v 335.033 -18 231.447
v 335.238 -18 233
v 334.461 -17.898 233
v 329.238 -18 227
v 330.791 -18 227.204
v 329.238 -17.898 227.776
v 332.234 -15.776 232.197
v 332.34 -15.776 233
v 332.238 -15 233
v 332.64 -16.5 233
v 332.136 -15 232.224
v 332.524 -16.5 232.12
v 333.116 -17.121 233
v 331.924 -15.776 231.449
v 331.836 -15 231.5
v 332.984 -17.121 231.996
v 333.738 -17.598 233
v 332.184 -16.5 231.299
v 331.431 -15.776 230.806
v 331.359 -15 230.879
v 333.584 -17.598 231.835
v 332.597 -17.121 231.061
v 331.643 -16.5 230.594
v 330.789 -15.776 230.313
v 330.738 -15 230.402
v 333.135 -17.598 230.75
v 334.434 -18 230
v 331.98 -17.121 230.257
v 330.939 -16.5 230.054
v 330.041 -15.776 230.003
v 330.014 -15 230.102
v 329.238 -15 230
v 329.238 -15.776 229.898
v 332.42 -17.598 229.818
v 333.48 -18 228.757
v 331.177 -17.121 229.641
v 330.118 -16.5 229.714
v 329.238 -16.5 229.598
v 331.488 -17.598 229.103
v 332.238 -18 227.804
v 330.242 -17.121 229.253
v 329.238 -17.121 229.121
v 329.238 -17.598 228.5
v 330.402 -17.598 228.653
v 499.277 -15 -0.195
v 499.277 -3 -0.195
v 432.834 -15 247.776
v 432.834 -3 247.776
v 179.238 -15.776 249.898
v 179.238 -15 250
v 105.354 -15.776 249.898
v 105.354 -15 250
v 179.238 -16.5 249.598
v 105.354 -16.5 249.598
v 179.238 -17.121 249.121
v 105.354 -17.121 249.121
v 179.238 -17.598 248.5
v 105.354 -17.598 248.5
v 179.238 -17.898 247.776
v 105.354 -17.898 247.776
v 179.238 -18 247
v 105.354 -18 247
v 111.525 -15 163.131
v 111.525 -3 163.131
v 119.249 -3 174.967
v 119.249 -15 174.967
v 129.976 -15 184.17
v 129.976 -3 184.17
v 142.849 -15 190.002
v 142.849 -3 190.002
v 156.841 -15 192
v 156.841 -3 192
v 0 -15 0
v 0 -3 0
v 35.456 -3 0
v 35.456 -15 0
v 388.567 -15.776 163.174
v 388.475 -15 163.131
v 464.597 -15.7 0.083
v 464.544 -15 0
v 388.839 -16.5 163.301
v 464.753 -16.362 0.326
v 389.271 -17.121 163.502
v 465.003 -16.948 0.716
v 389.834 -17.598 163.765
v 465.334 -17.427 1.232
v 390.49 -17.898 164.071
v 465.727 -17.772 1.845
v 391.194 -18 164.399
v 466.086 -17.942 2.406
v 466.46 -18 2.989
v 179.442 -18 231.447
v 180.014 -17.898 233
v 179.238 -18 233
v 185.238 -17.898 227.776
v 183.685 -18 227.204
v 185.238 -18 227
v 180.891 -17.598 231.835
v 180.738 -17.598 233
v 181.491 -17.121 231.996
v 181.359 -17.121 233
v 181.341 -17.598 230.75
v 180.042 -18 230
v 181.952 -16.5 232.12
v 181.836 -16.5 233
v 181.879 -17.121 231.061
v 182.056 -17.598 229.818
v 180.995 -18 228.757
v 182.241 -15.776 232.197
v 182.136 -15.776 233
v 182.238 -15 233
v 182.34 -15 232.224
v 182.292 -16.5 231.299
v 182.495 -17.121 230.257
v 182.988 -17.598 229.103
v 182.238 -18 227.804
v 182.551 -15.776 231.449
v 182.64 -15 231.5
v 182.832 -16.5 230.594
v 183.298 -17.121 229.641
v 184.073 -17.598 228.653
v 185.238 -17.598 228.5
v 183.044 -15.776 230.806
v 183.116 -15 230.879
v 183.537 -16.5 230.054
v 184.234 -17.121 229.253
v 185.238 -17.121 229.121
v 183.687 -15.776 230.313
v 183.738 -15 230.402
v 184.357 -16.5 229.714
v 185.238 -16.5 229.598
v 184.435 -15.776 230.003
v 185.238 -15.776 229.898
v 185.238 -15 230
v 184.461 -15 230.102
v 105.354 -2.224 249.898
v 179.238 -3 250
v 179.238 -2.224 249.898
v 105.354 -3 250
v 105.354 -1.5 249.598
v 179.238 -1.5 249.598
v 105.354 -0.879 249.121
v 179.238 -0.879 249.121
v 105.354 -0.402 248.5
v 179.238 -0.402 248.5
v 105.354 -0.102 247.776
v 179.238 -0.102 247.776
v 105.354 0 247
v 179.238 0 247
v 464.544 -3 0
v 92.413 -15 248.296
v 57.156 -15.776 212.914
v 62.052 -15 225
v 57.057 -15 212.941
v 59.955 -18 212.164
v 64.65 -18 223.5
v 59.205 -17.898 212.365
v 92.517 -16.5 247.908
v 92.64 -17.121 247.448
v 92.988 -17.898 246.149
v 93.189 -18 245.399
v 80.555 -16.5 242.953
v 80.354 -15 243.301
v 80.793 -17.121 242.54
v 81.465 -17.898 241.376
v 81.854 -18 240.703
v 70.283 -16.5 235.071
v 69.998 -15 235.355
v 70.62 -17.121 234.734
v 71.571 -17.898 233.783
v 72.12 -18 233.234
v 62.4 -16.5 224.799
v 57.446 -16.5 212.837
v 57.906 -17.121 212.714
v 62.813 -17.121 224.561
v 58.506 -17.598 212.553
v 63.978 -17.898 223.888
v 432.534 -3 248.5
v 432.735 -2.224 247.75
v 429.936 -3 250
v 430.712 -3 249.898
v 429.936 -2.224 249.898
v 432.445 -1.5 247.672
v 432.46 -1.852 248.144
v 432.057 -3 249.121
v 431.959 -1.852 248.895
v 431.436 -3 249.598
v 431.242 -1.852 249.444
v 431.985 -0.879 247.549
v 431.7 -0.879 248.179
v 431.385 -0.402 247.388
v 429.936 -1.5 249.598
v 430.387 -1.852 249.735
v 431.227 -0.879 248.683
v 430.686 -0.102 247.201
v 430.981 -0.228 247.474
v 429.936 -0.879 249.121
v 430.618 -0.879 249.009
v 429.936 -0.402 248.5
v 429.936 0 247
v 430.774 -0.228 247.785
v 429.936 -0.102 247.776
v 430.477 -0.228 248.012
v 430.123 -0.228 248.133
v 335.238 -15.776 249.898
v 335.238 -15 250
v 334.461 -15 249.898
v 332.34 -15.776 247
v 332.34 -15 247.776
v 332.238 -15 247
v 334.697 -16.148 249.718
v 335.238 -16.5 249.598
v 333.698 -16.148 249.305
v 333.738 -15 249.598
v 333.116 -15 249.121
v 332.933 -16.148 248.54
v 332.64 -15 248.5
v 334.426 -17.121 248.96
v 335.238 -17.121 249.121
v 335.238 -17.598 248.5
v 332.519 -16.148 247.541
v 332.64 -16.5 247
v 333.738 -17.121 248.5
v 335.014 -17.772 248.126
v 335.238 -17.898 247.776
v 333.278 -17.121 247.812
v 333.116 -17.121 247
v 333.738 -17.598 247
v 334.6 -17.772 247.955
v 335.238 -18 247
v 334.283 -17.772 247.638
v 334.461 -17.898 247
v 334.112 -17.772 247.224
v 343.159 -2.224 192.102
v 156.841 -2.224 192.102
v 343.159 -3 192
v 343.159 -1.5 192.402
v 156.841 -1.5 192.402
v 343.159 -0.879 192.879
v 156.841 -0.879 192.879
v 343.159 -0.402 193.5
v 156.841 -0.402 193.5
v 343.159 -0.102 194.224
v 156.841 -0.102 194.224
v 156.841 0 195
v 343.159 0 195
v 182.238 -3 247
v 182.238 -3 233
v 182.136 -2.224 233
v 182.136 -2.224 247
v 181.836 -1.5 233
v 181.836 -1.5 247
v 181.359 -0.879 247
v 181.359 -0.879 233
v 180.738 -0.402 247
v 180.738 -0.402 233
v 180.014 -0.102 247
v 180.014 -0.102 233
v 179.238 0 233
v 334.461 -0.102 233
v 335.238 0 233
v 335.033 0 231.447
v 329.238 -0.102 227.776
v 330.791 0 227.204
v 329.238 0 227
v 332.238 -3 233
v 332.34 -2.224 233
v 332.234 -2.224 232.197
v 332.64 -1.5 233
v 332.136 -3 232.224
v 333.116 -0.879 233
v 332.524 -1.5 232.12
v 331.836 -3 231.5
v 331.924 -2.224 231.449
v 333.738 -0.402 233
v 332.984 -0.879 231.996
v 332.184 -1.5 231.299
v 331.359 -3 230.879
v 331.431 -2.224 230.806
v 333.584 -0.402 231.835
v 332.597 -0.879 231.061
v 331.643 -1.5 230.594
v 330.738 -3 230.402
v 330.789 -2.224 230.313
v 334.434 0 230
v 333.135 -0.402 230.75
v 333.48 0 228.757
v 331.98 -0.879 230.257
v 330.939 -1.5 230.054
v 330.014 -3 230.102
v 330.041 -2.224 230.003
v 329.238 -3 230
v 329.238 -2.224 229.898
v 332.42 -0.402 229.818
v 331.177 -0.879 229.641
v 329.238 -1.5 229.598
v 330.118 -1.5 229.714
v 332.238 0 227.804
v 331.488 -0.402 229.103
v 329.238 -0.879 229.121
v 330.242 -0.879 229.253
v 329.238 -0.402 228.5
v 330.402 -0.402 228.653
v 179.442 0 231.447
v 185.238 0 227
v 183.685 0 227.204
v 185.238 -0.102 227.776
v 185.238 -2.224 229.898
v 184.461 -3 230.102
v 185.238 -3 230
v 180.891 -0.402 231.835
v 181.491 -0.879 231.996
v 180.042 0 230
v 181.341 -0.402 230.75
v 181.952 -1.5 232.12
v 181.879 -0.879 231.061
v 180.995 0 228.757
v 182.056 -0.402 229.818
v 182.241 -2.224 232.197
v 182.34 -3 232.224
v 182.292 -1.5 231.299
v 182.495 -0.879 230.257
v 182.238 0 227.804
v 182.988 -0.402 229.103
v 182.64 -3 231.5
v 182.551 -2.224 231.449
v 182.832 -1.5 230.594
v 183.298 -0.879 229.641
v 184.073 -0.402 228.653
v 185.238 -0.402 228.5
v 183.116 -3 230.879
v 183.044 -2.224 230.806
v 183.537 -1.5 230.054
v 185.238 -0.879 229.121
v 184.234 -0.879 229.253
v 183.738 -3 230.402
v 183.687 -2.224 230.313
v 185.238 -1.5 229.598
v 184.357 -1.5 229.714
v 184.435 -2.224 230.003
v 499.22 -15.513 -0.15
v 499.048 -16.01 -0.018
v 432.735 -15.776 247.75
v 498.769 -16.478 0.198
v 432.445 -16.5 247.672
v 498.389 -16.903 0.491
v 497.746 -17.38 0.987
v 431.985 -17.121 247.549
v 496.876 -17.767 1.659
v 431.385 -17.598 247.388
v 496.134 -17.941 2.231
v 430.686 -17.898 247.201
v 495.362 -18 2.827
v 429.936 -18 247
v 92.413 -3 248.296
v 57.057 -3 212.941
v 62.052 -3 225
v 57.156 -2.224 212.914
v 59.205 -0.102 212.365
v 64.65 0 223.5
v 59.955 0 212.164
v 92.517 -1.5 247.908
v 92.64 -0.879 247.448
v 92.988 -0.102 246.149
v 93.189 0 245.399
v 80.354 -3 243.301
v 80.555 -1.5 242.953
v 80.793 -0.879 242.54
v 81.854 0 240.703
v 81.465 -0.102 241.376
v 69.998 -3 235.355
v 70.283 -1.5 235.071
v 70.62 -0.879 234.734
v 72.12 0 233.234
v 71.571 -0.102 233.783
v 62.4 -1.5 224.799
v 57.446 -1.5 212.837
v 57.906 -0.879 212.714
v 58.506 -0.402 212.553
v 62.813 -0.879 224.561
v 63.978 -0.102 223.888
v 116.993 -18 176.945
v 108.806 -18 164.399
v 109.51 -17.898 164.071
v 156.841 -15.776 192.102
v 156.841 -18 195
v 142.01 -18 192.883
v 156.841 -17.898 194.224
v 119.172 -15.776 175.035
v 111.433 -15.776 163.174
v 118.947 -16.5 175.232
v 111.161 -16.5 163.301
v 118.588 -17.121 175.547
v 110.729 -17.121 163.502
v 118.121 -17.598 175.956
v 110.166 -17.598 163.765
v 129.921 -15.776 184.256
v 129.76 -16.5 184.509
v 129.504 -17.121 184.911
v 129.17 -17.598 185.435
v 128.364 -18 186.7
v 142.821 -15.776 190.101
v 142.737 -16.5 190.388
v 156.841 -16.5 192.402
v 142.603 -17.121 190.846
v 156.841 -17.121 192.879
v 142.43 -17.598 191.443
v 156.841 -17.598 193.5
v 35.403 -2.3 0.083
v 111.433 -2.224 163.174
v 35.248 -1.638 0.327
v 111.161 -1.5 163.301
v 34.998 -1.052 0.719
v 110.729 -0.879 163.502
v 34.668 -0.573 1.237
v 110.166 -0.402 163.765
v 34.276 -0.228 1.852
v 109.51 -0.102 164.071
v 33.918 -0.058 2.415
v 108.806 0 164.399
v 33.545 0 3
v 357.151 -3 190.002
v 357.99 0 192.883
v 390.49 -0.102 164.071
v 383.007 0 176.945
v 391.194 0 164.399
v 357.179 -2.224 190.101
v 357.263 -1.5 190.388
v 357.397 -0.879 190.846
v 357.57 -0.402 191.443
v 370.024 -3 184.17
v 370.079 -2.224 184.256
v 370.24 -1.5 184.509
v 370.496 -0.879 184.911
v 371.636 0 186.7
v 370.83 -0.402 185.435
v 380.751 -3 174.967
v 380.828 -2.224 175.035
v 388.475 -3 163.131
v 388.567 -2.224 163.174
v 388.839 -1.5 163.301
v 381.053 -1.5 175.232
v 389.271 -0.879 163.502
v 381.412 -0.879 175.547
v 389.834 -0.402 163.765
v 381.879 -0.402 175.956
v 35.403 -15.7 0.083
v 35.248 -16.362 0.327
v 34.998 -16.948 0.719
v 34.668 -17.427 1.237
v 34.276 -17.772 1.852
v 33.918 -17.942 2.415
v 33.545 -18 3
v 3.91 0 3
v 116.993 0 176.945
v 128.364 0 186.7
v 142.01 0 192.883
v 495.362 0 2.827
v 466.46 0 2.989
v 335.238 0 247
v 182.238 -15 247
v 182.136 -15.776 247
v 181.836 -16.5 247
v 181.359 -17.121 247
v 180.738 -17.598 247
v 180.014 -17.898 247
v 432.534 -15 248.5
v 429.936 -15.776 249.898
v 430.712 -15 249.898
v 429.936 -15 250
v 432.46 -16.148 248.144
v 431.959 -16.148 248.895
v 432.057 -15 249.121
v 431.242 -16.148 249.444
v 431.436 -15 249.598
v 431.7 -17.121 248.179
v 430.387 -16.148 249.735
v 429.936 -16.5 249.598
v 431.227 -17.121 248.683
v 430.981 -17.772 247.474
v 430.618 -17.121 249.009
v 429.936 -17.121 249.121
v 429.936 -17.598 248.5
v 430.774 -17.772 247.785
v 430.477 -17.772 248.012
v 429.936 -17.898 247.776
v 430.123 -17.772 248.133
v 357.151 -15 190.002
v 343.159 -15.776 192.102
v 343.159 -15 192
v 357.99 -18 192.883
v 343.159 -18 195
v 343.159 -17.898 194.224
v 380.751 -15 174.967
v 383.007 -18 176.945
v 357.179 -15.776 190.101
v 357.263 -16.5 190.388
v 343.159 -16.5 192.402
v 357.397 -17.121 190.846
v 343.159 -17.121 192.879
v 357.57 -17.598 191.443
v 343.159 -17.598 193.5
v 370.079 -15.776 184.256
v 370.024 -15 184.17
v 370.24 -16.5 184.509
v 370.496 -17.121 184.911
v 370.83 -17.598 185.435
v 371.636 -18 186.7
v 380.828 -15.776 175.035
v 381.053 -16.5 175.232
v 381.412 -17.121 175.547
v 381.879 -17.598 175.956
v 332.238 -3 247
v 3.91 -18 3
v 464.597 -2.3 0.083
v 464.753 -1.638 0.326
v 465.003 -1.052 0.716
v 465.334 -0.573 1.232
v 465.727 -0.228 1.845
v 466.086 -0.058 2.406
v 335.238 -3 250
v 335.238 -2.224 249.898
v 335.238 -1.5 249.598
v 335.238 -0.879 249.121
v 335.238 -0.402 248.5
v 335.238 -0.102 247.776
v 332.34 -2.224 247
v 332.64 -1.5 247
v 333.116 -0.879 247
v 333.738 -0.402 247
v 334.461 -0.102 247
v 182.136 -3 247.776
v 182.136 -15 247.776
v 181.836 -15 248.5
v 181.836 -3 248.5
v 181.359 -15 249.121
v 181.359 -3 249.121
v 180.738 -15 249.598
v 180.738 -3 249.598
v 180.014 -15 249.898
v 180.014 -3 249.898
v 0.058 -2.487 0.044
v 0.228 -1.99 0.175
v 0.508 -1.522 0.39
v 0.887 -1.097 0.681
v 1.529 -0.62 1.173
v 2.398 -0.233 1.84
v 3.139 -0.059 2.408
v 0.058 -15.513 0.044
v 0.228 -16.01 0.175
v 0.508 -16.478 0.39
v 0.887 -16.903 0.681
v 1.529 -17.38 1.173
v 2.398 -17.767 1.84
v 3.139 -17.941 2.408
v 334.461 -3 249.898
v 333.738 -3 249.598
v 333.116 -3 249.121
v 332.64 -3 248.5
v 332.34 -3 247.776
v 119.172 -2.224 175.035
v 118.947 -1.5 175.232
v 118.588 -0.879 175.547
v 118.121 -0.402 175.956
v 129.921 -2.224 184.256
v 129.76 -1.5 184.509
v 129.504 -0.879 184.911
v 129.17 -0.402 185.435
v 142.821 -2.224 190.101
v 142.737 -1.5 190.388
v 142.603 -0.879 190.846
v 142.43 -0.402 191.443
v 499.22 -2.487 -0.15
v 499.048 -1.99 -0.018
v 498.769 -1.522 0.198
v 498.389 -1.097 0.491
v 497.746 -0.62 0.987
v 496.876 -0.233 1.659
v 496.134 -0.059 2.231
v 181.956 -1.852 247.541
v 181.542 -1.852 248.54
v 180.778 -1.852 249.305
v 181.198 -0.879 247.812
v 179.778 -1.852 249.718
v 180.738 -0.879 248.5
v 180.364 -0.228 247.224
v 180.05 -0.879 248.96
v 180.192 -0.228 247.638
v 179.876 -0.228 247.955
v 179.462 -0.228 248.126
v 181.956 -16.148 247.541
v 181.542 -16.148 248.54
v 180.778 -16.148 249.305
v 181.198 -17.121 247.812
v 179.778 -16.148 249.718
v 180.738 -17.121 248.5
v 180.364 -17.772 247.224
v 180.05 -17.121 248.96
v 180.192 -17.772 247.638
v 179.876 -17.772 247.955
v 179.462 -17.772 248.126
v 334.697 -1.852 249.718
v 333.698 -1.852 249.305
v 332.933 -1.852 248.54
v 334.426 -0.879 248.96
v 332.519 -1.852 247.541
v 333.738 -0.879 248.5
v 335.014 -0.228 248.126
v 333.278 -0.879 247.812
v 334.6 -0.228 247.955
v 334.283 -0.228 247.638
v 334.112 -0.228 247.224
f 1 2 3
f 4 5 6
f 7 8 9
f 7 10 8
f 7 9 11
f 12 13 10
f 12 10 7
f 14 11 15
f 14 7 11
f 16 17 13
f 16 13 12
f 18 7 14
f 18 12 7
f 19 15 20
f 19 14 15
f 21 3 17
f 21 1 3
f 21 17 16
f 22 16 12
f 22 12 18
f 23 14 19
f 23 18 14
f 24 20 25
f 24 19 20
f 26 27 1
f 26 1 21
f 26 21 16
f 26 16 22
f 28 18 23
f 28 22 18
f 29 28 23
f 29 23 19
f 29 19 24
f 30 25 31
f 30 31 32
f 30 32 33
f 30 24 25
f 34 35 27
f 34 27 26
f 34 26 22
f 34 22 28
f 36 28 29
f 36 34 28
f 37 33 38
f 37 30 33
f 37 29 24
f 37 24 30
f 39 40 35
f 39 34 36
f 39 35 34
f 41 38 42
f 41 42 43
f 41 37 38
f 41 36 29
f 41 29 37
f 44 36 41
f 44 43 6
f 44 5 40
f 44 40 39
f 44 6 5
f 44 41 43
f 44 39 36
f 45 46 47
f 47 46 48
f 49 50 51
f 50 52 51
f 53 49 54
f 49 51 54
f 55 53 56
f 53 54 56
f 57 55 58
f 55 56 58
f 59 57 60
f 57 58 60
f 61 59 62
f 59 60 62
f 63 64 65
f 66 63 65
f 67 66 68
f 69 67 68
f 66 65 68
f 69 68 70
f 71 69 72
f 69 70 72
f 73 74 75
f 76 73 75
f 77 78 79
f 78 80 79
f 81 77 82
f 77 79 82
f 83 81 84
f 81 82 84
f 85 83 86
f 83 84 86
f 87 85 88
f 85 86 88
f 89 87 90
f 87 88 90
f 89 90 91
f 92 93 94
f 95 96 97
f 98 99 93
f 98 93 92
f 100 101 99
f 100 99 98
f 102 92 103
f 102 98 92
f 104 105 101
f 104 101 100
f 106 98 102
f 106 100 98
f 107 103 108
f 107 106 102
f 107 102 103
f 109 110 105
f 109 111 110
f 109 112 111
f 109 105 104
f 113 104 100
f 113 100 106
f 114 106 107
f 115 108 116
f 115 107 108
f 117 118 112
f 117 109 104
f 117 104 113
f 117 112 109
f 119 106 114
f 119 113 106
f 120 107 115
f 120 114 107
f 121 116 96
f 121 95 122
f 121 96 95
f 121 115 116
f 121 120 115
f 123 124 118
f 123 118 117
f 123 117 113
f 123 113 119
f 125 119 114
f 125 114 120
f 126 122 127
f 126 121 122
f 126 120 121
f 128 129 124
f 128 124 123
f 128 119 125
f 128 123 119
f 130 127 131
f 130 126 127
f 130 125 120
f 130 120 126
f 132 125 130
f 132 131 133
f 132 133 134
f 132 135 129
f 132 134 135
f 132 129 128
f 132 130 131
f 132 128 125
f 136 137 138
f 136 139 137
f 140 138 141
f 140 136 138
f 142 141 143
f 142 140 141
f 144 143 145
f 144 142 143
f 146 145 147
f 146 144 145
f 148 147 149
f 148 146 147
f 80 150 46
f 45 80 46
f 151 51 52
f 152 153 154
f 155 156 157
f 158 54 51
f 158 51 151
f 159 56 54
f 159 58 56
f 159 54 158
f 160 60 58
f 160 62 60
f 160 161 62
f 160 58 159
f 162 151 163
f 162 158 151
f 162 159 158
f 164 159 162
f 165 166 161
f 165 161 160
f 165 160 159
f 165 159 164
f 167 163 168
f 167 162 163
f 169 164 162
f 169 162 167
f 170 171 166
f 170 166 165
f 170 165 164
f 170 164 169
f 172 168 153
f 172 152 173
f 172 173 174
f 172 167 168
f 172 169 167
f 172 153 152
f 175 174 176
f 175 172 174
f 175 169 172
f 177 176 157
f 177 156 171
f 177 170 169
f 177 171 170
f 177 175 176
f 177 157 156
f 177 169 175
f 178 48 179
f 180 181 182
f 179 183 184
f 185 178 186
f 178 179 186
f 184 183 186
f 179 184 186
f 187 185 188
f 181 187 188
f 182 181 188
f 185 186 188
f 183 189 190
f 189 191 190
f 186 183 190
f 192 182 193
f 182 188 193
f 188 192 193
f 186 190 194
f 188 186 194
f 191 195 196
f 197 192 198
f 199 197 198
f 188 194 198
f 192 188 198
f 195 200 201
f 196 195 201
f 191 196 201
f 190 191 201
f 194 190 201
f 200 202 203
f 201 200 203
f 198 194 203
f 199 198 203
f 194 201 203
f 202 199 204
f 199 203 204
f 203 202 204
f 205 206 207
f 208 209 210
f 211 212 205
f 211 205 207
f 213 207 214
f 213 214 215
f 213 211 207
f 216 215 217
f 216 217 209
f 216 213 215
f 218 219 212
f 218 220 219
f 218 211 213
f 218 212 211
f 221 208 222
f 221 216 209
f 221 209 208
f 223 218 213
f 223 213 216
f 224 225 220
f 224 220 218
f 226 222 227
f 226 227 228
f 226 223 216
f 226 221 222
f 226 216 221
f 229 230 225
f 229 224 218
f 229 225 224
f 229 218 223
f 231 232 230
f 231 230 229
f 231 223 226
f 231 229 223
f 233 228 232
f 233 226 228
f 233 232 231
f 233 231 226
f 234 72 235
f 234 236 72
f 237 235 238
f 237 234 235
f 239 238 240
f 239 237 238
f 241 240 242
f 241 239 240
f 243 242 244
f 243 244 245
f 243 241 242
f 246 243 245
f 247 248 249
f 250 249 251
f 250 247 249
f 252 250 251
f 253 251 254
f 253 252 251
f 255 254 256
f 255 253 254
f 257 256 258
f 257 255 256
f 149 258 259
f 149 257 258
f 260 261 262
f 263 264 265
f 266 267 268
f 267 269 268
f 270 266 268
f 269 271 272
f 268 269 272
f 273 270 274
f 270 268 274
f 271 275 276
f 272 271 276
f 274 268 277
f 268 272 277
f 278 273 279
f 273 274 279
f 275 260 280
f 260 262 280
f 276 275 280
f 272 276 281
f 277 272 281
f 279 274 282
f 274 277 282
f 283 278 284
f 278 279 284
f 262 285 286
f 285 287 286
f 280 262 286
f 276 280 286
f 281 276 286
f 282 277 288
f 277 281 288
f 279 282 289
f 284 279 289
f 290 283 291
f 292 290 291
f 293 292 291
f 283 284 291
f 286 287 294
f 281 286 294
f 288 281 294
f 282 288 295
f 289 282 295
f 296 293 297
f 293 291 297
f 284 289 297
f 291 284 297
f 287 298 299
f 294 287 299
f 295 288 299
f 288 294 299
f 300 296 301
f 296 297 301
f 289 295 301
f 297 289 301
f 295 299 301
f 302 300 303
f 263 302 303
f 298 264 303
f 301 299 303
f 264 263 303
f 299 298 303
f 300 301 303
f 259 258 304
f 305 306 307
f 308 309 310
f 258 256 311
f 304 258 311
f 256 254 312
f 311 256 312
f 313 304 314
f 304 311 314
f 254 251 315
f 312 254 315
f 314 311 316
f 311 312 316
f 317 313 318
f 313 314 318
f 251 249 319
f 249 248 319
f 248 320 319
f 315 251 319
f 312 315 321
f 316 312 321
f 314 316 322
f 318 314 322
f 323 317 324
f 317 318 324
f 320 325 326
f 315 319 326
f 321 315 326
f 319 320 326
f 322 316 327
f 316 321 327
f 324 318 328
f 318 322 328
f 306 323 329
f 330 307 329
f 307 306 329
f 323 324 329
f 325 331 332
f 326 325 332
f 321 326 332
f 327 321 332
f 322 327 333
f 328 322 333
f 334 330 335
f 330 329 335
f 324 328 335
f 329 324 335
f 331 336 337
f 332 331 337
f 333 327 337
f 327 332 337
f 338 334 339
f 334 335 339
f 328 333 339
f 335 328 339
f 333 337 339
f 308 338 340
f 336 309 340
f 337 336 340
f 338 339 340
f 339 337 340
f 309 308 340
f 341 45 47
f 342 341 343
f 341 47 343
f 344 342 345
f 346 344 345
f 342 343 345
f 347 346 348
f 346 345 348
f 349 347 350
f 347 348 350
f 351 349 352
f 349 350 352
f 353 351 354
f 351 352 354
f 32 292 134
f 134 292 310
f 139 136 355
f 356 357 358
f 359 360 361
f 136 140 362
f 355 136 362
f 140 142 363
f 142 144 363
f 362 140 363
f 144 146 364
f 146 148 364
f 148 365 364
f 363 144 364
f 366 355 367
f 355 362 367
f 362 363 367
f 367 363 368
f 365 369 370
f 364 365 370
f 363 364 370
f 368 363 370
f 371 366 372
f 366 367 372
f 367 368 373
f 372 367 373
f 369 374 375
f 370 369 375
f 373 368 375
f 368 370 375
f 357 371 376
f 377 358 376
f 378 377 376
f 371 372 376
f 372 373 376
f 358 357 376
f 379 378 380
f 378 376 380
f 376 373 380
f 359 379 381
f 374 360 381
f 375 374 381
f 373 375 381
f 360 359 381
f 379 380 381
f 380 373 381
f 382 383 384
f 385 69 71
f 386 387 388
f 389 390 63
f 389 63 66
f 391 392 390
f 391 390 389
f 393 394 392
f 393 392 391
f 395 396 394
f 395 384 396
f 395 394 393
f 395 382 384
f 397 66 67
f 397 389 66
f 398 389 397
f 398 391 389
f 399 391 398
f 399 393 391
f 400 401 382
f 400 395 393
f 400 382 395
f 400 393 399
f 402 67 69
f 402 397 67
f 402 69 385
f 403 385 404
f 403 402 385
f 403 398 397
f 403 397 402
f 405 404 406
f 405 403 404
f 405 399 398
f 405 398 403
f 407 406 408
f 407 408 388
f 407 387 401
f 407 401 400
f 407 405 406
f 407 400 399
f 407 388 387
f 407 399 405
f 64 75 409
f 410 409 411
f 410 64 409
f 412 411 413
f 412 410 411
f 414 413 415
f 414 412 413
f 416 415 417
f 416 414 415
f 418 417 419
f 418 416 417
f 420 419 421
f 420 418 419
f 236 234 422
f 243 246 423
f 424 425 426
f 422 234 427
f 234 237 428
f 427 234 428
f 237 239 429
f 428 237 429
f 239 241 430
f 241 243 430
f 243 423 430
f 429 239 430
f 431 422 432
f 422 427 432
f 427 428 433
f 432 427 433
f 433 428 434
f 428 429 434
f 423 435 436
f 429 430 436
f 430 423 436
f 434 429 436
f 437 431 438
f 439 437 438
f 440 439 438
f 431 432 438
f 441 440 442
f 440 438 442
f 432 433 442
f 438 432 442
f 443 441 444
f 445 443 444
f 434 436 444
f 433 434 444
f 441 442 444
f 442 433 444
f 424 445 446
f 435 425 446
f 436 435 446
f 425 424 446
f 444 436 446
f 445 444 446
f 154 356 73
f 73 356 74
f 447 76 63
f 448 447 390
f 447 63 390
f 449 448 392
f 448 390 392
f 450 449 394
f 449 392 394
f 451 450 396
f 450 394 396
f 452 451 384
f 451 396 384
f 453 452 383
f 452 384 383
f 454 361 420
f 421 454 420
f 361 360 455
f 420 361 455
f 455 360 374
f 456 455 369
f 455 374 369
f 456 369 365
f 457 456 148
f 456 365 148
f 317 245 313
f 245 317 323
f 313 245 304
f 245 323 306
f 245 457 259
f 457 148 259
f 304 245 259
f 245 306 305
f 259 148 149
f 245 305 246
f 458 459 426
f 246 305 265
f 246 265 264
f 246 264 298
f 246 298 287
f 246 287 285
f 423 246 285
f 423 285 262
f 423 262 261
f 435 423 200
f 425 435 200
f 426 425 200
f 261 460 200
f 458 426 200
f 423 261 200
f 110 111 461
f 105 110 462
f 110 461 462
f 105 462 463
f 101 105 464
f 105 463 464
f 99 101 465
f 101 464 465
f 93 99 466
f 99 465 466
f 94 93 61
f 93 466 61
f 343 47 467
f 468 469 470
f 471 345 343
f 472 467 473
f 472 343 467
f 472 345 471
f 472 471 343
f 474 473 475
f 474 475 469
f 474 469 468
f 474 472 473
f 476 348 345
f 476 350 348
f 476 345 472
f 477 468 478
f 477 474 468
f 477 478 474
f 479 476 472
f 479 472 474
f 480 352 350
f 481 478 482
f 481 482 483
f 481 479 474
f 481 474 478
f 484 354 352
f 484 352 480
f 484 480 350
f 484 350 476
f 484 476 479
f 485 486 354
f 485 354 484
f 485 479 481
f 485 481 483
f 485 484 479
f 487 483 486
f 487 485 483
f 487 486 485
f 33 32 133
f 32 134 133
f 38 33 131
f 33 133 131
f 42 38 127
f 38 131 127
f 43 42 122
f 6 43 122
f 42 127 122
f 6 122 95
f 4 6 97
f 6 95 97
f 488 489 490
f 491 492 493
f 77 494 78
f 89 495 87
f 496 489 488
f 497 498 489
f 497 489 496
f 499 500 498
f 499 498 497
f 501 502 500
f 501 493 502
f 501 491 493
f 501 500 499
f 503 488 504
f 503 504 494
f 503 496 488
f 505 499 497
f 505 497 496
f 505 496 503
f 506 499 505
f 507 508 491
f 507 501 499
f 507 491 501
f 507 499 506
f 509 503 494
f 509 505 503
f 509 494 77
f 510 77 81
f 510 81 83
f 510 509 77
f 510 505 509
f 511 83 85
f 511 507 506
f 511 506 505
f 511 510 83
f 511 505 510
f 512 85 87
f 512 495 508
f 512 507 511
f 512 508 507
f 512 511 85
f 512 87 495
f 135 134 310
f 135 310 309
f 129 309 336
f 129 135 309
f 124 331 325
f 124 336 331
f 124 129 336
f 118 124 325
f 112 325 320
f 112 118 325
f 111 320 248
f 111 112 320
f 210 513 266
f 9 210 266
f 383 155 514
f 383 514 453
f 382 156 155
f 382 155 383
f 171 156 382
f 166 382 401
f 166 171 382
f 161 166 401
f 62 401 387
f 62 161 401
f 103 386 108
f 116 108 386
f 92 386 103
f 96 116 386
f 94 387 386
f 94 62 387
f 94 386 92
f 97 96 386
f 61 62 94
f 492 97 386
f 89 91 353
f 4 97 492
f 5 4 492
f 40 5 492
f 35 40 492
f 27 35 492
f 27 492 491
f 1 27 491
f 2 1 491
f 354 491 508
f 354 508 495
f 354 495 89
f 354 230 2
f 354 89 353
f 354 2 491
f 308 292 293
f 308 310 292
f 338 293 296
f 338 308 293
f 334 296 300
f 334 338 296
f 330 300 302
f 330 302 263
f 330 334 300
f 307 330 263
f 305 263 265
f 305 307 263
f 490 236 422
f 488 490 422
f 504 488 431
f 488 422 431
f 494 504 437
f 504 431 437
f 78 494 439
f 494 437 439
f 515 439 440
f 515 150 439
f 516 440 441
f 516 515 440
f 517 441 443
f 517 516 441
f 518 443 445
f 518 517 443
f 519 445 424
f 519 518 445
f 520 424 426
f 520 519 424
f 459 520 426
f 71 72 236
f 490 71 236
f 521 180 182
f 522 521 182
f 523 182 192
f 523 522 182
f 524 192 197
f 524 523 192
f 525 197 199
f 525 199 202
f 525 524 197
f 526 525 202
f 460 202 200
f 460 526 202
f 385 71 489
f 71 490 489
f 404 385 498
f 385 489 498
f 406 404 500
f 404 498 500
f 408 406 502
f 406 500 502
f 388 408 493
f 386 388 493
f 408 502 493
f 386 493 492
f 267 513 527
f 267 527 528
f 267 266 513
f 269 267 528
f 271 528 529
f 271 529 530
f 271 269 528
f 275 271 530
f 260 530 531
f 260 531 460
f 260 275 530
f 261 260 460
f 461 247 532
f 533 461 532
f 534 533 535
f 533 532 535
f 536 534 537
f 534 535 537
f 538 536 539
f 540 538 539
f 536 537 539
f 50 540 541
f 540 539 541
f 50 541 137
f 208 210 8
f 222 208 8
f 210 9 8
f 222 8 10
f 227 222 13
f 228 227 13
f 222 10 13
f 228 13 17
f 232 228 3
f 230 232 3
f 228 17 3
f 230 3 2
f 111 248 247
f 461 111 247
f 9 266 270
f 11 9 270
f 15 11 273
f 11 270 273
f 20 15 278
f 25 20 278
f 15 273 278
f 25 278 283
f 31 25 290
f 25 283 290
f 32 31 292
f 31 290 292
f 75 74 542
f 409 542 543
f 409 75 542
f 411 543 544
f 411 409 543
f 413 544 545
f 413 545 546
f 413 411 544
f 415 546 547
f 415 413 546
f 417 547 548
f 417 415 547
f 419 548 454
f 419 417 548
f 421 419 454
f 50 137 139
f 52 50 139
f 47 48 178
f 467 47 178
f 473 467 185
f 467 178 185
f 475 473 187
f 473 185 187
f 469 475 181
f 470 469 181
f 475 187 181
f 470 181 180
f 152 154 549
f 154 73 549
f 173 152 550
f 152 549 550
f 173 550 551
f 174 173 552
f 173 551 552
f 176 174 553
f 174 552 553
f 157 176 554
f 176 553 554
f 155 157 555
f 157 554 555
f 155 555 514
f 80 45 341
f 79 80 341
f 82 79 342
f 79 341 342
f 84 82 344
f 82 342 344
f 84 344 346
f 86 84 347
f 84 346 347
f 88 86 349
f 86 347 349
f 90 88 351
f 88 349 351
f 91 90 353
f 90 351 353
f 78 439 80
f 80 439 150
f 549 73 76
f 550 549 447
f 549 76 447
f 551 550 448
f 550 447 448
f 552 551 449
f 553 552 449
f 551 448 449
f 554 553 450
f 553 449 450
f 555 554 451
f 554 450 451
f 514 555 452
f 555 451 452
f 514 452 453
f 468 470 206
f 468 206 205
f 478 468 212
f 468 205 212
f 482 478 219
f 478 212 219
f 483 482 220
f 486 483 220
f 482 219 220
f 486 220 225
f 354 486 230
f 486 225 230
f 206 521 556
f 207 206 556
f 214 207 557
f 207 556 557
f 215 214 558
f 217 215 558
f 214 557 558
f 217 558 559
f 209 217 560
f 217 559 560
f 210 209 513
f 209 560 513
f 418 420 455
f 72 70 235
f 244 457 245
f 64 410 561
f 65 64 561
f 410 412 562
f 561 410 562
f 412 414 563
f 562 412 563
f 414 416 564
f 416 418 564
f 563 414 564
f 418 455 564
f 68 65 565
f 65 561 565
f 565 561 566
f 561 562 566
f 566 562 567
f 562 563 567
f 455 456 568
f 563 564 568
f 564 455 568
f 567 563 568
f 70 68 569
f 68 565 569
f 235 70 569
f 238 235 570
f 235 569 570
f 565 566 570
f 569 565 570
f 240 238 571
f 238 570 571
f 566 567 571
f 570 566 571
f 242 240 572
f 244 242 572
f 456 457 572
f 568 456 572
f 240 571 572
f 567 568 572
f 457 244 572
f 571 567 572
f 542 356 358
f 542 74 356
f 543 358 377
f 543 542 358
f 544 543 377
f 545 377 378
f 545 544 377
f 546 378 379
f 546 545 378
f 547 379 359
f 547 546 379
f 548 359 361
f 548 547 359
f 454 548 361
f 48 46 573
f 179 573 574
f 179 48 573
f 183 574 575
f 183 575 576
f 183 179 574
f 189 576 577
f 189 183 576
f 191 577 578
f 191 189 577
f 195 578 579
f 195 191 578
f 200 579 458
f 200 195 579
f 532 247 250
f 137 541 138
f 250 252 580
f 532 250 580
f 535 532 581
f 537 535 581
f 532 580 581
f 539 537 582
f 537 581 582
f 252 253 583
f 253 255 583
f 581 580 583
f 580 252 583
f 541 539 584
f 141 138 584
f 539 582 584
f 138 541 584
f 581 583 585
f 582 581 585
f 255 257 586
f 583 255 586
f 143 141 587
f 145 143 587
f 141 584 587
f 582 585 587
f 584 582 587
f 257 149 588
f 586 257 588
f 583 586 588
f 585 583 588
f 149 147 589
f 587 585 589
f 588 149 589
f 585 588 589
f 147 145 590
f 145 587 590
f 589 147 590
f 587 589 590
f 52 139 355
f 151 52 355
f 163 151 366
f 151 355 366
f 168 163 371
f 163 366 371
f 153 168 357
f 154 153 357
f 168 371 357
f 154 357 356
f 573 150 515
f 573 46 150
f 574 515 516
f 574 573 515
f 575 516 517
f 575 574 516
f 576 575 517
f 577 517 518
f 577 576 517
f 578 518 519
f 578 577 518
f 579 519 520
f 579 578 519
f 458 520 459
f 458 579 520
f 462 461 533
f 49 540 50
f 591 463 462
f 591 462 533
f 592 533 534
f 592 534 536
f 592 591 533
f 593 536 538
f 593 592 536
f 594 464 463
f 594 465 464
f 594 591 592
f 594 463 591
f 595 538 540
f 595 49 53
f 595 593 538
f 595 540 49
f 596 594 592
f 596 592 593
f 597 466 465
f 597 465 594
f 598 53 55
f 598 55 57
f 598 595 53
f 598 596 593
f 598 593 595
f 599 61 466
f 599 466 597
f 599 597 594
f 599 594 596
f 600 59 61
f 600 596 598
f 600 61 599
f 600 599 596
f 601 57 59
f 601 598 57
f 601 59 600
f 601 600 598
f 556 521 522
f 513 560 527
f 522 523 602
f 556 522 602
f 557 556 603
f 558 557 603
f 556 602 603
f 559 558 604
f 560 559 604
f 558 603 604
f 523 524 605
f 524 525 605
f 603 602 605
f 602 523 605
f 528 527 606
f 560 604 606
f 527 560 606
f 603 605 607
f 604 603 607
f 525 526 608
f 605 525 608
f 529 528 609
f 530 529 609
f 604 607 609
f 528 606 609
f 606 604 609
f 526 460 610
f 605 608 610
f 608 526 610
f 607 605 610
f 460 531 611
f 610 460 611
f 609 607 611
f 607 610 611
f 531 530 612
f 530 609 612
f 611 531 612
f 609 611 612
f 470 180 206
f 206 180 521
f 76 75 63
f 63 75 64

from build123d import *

# Parameters (mm, degrees)
F1_DEPTH = 18
F2_R     = 3


with BuildPart() as f1:
    # F0 (on Front) → F1 (new body)
    with BuildSketch(Plane.XZ):
        with BuildLine():
            Line((57.0573561923, 212.9409522551), (0, 0))
            Line((0, 0), (35.456227742, 0))
            Line((35.456227742, 0), (111.5254217963, 163.130913087))
            ThreePointArc((111.5254217963, 163.130913087), (129.9758307308, 184.1695722906), (156.8408111482, 192))
            Line((156.8408111482, 192), (250, 192))
            Line((250, 192), (343.1591888518, 192))
            ThreePointArc((343.1591888518, 192), (370.0241692692, 184.1695722906), (388.4745782037, 163.130913087))
            Line((388.4745782037, 163.130913087), (464.543772258, 0))
            Line((464.543772258, 0), (499.2772410304, -0.1947824512))
            Line((499.2772410304, -0.1947824512), (432.8335476371, 247.7764571353))
            ThreePointArc((432.8335476371, 247.7764571353), (431.7620544452, 249.3800600209), (429.9357701582, 250))
            Line((429.9357701582, 250), (335.2377511221, 250))
            ThreePointArc((335.2377511221, 250), (333.1164307786, 249.1213203436), (332.2377511221, 247))
            Line((332.2377511221, 247), (332.2377511221, 233))
            ThreePointArc((332.2377511221, 233), (331.3590714657, 230.8786796564), (329.2377511221, 230))
            Line((329.2377511221, 230), (188.7601000309, 230))
            Line((188.7601000309, 230), (182.2377511221, 230))
            Line((182.2377511221, 230), (182.2377511221, 232.7267350544))
            Line((182.2377511221, 232.7267350544), (182.2377511221, 242.7267350544))
            Line((182.2377511221, 242.7267350544), (182.2377511221, 247))
            ThreePointArc((182.2377511221, 247), (181.3590714657, 249.1213203436), (179.2377511221, 250))
            Line((179.2377511221, 250), (178.7601000309, 250))
            Line((178.7601000309, 250), (105.3536475067, 250))
            ThreePointArc((105.3536475067, 250), (74.9155760563, 239.6676670146), (57.0573561923, 212.9409522551))
        make_face()
    extrude(amount=F1_DEPTH)

    # F2
    f2_edges = [f1.edges().sort_by_distance(p)[0] for p in [
        (28.528678, -18, 106.470476),
        (17.728114, -18, 0),
        (73.490825, -18, 81.565457),
        (129.975831, -18, 184.169572),
        (250, -18, 192),
        (370.024169, -18, 184.169572),
        (426.509175, -18, 81.565457),
        (481.910507, -18, -0.097391),
        (466.055394, -18, 123.790837),
        (431.762054, -18, 249.38006),
        (382.586761, -18, 250),
        (333.116431, -18, 249.12132),
        (332.237751, -18, 240),
        (331.359071, -18, 230.87868),
        (255.737751, -18, 230),
        (182.237751, -18, 238.5),
        (181.359071, -18, 249.12132),
        (142.295699, -18, 250),
        (74.915576, -18, 239.667667),
        (28.528678, 0, 106.470476),
        (17.728114, 0, 0),
        (73.490825, 0, 81.565457),
        (129.975831, 0, 184.169572),
        (250, 0, 192),
        (370.024169, 0, 184.169572),
        (426.509175, 0, 81.565457),
        (481.910507, 0, -0.097391),
        (466.055394, 0, 123.790837),
        (431.762054, 0, 249.38006),
        (382.586761, 0, 250),
        (333.116431, 0, 249.12132),
        (332.237751, 0, 240),
        (331.359071, 0, 230.87868),
        (255.737751, 0, 230),
        (182.237751, 0, 238.5),
        (181.359071, 0, 249.12132),
        (142.295699, 0, 250),
        (74.915576, 0, 239.667667),
        (182.237751, -9, 230),
    ]]
    fillet(f2_edges, radius=F2_R)


solid = f1.part
